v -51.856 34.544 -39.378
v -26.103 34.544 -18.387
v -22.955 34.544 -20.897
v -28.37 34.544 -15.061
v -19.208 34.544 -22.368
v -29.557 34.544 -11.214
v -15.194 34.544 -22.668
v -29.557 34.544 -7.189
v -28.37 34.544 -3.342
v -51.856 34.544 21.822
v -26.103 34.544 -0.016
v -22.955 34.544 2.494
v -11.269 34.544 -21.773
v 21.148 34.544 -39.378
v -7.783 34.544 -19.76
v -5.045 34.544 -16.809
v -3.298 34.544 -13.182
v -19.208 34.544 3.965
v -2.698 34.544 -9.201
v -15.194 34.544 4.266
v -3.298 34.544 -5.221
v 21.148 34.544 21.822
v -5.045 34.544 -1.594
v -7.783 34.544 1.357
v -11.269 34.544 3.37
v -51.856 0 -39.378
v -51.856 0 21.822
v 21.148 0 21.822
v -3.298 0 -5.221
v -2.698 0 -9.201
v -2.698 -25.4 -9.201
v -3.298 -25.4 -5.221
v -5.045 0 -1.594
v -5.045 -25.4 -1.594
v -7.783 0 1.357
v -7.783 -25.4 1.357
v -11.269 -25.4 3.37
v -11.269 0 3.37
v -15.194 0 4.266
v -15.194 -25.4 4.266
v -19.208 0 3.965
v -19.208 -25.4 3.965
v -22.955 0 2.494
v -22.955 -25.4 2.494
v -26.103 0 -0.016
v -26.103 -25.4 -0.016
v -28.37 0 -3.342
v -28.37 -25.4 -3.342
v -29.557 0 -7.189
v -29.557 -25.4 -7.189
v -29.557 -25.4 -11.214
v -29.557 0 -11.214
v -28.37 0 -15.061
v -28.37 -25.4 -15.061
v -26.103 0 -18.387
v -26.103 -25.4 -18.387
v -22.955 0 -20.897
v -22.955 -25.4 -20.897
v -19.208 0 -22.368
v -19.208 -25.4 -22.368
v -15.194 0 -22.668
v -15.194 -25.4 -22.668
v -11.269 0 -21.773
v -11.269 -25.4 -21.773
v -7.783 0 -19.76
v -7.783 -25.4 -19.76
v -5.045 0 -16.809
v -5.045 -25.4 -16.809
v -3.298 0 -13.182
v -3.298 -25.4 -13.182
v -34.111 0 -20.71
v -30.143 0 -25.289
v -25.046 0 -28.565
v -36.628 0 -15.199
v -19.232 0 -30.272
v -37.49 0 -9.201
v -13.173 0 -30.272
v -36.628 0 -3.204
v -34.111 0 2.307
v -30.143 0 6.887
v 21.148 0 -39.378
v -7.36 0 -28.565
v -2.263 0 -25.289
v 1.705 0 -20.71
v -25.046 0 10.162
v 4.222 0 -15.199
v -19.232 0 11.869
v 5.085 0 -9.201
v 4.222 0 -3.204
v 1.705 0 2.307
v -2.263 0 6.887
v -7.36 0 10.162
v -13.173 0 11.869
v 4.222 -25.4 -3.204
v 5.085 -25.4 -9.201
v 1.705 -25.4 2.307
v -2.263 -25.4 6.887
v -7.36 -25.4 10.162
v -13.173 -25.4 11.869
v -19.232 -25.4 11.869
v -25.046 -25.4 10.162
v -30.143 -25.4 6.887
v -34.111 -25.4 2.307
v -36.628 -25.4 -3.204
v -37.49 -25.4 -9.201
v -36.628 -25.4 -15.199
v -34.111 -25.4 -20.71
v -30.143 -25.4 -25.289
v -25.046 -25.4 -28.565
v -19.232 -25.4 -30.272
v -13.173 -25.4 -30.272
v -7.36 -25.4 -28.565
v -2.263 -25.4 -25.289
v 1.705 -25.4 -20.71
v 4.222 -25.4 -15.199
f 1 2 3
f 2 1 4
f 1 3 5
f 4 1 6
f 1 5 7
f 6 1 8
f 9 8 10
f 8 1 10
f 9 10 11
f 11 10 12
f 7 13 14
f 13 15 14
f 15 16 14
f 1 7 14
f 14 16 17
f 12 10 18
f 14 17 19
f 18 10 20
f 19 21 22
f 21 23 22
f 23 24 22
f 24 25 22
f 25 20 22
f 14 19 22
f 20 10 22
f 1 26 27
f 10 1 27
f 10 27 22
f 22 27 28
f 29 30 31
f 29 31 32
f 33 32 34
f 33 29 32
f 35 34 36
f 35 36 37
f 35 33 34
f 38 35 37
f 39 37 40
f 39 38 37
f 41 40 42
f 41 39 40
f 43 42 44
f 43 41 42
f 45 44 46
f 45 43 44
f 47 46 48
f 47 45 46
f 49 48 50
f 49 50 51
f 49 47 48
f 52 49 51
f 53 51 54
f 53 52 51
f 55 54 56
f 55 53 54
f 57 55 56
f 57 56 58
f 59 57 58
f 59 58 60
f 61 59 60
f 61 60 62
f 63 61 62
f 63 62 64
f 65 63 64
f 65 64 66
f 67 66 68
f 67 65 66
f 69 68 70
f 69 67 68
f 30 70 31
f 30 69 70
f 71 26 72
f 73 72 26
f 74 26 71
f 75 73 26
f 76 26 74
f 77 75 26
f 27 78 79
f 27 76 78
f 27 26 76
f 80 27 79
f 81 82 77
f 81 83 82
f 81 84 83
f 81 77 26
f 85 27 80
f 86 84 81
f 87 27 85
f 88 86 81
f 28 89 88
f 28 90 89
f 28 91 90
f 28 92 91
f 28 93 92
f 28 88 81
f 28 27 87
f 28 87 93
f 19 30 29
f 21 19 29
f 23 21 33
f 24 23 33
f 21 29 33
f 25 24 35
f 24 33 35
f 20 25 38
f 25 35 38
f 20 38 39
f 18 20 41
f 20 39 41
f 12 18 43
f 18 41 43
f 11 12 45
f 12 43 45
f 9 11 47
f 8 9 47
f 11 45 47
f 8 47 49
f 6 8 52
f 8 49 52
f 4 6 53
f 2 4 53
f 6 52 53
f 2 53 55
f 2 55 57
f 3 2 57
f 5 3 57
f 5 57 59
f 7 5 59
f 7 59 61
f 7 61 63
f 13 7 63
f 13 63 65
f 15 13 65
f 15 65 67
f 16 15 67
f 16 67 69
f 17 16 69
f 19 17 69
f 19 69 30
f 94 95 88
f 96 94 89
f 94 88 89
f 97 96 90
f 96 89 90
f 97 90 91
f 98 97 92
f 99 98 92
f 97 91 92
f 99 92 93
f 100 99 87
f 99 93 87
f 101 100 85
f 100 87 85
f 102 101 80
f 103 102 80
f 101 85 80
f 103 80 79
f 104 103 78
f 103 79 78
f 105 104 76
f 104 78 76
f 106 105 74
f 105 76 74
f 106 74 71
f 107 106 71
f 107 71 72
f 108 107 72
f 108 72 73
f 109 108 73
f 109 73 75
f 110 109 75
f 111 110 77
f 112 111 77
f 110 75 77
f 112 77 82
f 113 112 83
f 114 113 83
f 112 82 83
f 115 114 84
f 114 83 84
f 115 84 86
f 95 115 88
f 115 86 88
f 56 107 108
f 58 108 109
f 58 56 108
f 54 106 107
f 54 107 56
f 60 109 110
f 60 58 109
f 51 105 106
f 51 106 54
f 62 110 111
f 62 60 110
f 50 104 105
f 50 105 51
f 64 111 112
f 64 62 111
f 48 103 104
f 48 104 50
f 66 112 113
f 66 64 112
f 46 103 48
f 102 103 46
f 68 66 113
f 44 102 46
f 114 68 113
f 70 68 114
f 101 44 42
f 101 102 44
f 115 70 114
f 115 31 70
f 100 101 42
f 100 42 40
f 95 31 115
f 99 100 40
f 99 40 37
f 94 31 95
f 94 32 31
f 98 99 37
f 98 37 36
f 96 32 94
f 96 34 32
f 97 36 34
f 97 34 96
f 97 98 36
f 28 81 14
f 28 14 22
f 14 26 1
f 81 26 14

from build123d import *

# Parameters (mm, degrees)
F0_W     = 73.004455
F0_H     = 61.200289
F1_DEPTH = 34.544
F2_R     = 13.504776
F3_DEPTH = 69.342
F2_R_2   = 21.287393
F4_DEPTH = 25.4


with BuildPart() as f1:
    # F0 (on Front) → F1 (new body)
    with BuildSketch(Plane.XZ):
        with Locations((-15.354115, -8.777854)):
            Rectangle(F0_W, F0_H)
    extrude(amount=-F1_DEPTH)

    # F2 (on face) → F3 (cut)
    with BuildSketch(Plane.XZ):
        with Locations((-16.202834, -9.201426)):
            Circle(F2_R)
    extrude(amount=-F3_DEPTH, mode=Mode.SUBTRACT)

    # F2 (on face) → F4 (join)
    with BuildSketch(Plane.XZ):
        with Locations((-16.202834, -9.201426)):
            Circle(F2_R_2)
        with Locations((-16.202834, -9.201426)):
            Circle(F2_R, mode=Mode.SUBTRACT)
    extrude(amount=F4_DEPTH)


solid = f1.part
